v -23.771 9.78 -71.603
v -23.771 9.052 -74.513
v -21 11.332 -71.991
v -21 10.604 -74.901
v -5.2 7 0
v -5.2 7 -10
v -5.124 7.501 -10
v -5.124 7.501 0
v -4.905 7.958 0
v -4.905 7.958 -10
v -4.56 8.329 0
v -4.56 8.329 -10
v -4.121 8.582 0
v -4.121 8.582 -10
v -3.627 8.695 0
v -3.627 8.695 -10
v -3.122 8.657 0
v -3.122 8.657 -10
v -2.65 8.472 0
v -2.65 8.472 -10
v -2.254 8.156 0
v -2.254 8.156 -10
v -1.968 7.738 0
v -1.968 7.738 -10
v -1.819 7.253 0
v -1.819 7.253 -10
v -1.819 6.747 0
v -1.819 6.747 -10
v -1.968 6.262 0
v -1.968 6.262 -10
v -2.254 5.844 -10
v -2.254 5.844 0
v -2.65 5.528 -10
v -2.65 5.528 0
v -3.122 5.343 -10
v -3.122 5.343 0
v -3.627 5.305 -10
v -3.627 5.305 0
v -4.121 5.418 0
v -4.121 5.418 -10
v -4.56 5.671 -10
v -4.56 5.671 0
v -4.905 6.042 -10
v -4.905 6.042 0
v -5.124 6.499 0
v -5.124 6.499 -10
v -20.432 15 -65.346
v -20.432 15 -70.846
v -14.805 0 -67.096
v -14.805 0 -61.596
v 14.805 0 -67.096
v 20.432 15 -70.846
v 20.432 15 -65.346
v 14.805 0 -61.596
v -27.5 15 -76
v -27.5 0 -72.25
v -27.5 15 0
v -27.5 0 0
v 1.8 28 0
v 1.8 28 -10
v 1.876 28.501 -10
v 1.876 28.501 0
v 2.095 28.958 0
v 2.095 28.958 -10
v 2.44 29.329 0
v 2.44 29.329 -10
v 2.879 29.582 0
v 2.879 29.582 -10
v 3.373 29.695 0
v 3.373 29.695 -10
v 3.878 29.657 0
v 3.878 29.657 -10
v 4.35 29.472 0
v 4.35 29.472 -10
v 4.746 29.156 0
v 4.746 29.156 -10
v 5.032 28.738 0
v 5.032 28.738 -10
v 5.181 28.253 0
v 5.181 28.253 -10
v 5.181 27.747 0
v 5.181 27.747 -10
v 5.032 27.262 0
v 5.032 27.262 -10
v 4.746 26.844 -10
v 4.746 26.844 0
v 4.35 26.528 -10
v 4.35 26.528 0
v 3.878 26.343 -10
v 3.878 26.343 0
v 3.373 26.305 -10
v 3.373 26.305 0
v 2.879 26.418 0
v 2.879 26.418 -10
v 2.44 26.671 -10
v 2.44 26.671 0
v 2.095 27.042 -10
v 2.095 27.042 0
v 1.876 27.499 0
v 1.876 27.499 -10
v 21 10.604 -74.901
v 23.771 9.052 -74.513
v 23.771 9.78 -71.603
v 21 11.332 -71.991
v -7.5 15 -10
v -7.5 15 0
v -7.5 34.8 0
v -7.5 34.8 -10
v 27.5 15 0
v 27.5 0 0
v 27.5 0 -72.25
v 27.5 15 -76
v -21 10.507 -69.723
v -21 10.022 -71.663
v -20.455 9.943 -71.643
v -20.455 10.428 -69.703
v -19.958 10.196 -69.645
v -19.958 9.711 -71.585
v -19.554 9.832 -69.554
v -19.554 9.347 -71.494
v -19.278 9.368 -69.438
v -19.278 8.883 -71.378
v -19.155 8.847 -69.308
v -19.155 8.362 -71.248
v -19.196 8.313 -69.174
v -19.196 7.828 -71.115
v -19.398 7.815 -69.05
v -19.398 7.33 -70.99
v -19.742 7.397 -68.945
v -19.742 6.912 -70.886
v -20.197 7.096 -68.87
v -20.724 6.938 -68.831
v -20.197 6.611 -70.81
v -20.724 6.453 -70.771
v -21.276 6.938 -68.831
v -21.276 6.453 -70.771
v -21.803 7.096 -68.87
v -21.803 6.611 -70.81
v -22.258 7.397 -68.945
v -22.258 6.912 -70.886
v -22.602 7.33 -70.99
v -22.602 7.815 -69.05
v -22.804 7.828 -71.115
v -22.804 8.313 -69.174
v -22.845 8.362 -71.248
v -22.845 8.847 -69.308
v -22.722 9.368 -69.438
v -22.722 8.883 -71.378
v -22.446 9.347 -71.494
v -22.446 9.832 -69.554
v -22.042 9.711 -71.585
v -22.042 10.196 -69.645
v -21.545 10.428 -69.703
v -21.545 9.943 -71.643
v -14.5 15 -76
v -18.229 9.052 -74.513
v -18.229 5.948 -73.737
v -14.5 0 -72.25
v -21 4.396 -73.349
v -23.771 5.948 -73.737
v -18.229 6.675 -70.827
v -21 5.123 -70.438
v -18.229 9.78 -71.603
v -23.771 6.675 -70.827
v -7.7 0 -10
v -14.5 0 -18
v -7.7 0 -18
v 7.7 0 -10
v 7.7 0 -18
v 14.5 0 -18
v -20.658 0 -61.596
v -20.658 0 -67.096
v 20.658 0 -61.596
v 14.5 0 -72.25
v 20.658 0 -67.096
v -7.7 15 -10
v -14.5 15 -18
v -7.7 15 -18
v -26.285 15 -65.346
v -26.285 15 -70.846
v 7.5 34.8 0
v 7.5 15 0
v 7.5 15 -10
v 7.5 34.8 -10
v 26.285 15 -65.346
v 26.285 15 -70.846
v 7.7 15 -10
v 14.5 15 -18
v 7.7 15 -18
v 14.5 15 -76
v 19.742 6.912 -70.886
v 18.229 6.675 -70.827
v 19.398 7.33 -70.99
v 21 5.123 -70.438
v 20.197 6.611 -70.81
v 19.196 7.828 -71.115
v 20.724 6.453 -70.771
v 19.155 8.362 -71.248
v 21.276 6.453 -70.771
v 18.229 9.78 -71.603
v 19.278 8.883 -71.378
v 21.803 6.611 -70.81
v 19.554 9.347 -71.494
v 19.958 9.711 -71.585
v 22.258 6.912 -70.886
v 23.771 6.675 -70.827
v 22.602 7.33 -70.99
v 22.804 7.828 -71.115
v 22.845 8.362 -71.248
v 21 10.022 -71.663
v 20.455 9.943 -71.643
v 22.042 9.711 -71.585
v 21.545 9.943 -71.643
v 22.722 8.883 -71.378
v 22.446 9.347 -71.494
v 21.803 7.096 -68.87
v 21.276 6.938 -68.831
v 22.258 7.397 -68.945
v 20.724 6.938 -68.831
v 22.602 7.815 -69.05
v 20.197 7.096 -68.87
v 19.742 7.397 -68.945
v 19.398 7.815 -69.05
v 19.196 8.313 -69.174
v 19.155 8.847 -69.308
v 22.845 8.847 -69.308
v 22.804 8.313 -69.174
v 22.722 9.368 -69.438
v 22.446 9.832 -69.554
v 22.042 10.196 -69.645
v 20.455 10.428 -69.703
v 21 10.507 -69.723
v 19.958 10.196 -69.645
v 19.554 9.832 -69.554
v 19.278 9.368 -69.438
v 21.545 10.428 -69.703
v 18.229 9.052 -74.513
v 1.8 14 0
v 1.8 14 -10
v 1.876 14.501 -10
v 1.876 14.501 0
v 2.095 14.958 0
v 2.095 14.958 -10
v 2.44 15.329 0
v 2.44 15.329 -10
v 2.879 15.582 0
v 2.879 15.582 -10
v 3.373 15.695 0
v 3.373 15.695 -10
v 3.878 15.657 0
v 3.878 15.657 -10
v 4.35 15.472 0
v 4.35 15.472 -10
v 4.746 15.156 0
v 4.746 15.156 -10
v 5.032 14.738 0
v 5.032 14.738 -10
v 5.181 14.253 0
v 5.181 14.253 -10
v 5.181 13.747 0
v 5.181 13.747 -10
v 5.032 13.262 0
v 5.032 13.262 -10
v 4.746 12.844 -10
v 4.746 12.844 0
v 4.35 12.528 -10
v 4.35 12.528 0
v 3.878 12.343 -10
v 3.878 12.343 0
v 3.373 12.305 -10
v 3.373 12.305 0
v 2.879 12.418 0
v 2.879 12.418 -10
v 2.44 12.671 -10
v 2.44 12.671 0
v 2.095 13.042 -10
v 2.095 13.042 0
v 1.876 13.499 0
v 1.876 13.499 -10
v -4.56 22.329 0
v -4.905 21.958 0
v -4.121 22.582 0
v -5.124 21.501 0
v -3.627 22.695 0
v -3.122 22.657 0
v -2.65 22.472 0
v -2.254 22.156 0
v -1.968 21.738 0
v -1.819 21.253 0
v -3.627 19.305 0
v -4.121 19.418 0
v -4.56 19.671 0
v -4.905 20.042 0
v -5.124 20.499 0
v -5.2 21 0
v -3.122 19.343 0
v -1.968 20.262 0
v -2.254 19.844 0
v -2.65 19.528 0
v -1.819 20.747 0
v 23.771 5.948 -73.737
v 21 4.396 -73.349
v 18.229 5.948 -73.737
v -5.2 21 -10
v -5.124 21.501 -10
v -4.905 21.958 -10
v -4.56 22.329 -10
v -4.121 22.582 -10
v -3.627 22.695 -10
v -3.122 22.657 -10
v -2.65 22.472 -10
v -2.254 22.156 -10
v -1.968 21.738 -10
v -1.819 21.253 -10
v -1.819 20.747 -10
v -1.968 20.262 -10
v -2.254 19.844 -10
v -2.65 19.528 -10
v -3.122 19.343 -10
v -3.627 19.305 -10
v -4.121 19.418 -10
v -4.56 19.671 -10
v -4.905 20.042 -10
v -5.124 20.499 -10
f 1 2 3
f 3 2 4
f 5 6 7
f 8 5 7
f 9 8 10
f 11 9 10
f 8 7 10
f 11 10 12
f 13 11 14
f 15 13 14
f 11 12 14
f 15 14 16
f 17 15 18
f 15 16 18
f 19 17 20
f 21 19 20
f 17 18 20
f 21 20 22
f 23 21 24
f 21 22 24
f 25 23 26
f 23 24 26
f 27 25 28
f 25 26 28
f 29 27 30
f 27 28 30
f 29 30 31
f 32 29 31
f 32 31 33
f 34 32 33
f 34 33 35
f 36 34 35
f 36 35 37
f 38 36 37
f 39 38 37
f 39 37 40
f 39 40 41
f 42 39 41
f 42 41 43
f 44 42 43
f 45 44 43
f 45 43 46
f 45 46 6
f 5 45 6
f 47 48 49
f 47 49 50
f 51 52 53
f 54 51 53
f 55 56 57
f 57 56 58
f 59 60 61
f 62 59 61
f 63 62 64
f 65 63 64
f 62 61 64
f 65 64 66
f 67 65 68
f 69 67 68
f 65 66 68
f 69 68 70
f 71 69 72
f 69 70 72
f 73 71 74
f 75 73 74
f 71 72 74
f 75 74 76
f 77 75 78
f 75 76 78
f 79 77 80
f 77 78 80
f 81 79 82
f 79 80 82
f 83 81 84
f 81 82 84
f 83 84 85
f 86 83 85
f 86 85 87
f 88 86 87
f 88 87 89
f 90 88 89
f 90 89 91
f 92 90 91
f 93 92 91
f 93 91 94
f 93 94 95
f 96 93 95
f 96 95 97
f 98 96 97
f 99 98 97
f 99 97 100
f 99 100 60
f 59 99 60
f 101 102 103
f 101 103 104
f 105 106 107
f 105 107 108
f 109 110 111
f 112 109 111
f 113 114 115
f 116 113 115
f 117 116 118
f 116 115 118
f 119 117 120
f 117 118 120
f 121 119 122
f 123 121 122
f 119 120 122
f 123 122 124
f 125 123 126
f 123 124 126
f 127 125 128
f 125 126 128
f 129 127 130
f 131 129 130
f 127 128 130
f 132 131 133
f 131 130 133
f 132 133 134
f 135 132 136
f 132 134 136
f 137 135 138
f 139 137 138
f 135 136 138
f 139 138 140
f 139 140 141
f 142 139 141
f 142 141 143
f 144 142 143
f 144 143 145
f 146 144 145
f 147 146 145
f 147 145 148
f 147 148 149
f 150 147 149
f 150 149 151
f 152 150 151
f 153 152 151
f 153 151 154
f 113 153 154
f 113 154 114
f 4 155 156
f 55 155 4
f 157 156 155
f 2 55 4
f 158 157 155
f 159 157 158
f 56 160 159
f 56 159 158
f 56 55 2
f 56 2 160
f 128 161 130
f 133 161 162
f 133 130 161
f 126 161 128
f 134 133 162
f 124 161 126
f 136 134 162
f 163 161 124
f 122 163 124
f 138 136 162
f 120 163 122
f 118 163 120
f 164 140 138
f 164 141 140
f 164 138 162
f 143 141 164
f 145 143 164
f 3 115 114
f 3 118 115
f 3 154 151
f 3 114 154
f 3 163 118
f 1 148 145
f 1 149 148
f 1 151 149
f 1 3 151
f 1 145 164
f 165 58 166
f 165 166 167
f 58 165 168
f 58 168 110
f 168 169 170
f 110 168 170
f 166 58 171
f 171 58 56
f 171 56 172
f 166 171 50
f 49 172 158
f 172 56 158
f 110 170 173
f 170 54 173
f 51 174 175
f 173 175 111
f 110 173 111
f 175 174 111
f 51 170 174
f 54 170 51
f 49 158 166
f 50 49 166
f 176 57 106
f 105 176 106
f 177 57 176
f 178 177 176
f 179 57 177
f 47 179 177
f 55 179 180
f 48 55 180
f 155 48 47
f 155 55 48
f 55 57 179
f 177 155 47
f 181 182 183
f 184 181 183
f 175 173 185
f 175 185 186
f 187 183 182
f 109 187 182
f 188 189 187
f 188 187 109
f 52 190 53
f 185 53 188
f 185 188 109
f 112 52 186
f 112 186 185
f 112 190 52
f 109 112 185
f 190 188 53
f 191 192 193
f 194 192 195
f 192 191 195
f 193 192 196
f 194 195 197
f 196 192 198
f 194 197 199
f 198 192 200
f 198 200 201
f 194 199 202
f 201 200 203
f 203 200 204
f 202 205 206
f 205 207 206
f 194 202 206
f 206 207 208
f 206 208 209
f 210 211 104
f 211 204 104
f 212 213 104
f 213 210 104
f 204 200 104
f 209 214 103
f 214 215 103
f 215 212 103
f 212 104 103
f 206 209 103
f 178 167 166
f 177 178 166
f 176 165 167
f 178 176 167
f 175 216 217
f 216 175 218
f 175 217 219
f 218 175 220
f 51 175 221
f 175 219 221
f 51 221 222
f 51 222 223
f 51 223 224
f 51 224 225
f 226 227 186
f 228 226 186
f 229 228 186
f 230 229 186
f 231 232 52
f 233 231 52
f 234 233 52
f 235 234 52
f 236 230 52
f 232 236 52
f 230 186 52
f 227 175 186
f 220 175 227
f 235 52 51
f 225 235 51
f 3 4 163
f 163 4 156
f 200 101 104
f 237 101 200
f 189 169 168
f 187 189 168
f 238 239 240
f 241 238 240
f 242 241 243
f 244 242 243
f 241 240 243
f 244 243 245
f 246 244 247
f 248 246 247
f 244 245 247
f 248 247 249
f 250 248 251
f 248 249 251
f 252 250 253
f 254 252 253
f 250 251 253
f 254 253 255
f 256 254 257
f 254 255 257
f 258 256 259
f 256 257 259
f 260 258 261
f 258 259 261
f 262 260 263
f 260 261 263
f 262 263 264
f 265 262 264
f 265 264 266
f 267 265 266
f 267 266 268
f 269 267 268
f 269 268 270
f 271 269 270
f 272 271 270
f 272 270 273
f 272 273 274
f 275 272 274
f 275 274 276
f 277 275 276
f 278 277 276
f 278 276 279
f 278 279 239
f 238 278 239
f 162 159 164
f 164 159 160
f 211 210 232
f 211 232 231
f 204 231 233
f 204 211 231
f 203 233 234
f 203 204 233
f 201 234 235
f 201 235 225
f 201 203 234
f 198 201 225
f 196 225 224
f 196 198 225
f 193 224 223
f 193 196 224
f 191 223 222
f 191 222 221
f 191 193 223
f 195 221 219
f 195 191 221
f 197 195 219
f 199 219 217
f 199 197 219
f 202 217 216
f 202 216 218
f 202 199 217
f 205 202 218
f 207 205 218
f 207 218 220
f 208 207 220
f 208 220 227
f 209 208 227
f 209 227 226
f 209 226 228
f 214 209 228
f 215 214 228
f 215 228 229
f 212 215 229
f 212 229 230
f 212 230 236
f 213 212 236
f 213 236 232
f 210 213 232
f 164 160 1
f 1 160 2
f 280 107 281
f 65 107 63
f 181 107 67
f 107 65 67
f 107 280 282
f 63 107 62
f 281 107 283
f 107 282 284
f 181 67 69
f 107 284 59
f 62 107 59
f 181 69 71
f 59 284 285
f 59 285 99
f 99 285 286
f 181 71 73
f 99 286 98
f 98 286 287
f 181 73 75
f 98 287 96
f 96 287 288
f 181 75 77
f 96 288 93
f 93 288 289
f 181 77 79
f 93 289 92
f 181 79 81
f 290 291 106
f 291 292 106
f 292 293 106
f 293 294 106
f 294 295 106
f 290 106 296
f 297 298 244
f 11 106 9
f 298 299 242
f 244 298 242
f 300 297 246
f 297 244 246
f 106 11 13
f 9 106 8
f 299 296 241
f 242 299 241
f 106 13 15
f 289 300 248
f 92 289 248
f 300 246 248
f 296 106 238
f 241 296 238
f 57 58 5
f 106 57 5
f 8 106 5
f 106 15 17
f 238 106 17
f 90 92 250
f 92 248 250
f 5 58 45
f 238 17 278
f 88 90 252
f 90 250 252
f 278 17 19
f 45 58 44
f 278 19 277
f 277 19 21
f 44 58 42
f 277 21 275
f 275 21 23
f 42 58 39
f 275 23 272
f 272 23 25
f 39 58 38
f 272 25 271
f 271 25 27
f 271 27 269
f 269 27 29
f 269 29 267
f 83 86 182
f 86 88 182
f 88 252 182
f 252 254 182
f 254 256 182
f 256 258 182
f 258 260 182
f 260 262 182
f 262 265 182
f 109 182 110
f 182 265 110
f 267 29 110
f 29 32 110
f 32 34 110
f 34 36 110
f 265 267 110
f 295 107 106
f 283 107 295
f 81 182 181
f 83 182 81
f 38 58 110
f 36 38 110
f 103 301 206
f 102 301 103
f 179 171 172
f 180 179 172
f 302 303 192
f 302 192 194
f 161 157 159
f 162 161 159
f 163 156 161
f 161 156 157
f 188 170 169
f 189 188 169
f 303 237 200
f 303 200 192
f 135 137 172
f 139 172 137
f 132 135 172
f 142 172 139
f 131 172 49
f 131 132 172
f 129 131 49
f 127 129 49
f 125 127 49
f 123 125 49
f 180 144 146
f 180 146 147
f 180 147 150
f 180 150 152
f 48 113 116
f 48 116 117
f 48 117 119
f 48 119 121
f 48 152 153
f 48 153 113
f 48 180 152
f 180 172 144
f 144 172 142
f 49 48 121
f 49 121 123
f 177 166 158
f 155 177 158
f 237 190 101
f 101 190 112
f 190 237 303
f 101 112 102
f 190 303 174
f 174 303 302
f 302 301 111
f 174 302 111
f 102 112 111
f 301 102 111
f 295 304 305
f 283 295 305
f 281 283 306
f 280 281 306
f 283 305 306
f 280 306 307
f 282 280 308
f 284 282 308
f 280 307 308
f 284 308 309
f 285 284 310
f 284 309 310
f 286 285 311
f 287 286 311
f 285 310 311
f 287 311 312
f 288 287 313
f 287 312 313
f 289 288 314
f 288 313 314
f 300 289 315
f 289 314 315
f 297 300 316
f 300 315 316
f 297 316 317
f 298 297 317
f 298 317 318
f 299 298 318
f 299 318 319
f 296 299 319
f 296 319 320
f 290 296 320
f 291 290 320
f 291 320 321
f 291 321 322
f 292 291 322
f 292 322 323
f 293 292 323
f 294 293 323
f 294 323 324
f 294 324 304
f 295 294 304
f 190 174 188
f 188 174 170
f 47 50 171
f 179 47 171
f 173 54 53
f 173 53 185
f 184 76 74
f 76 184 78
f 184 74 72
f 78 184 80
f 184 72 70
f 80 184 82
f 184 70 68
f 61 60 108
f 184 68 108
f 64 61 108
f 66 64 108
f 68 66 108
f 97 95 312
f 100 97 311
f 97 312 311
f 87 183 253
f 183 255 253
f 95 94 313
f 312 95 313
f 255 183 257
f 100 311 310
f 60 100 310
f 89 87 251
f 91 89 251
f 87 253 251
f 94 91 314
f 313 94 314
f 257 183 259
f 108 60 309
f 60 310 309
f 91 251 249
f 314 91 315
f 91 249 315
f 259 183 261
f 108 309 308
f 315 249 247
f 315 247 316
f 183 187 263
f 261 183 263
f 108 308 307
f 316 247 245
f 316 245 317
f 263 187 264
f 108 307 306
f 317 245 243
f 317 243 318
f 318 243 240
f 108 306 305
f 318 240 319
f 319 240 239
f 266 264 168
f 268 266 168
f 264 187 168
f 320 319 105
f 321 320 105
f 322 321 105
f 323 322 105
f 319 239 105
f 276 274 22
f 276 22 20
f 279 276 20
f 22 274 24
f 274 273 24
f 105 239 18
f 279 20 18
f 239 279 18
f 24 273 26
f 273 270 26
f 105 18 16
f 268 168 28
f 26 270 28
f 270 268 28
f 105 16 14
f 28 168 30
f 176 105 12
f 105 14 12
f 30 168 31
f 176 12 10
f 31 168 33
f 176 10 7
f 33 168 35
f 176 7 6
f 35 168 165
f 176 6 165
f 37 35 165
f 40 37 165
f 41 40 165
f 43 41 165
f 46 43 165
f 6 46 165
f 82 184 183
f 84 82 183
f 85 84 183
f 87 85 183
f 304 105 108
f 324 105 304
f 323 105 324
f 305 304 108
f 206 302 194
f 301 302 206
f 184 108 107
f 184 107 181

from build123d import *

# Parameters (mm, degrees)
BOSS_EXTRUDE1_DEPTH = 15
SKETCH2_W           = 15
SKETCH2_H           = 10
BOSS_EXTRUDE2_DEPTH = 19.8
CUT_EXTRUDE2_REACH  = 81.519
SKETCH4_R           = 1.7
LPATTERN1_COUNT     = 2
LPATTERN1_PITCH     = 14
CUT_EXTRUDE4_REACH  = 102.06
CUT_EXTRUDE5_START  = -38.811107067
CUT_EXTRUDE5_DEPTH  = 19.709275544
CUT_EXTRUDE6_DEPTH  = 3
CUT_EXTRUDE7_REACH  = 89.185
SKETCH10_R          = 1.85


# Read off the part's stored shape, not the designer's step: Cut-Extrude5
with BuildPart() as part:
    # Sketch1 → Boss-Extrude1 (new body)
    with BuildSketch(Plane(origin=(0, 0, 0), x_dir=(1, 0, 0), z_dir=(0, 1, 0))):
        Polygon((-27.5, 0), (27.5, 0), (27.5, 76), (14.5, 76), (14.5, 18), (7.7, 18), (7.7, 10), (-7.7, 10), (-7.7, 18), (-14.5, 18), (-14.5, 76), (-27.5, 76), align=None)
    extrude(amount=BOSS_EXTRUDE1_DEPTH)

    # Sketch2 → Boss-Extrude2 (add)
    with BuildSketch(Plane(origin=(0, 15, 0), x_dir=(1, 0, 0), z_dir=(0, 1, 0))):
        with Locations((0, 5)):
            Rectangle(SKETCH2_W, SKETCH2_H)
    extrude(amount=BOSS_EXTRUDE2_DEPTH)

    # Sketch4 → Cut-Extrude2 (cut, up to next)
    with BuildSketch(Plane(origin=(0, 0, -10), x_dir=(-1, 0, 0), z_dir=(0, 0, -1)), mode=Mode.PRIVATE) as cut_extrude2_sk1:
        with Locations((-3.5, 28)):
            Circle(SKETCH4_R)
    cut_extrude2_tool1 = extrude(cut_extrude2_sk1.sketch, amount=-CUT_EXTRUDE2_REACH, mode=Mode.PRIVATE) & part.part
    # Sketch4 → Cut-Extrude2 (cut, up to next)
    with BuildSketch(Plane(origin=(0, 0, -10), x_dir=(-1, 0, 0), z_dir=(0, 0, -1)), mode=Mode.PRIVATE) as cut_extrude2_sk2:
        with Locations((3.5, 21)):
            Circle(SKETCH4_R)
    cut_extrude2_tool2 = extrude(cut_extrude2_sk2.sketch, amount=-CUT_EXTRUDE2_REACH, mode=Mode.PRIVATE) & part.part
    cut_extrude2_1 = cut_extrude2_tool1.solids().sort_by_distance((3.5, 28, -10))[0]
    add(cut_extrude2_1, mode=Mode.SUBTRACT)
    cut_extrude2_2 = cut_extrude2_tool2.solids().sort_by_distance((-3.5, 21, -10))[0]
    add(cut_extrude2_2, mode=Mode.SUBTRACT)
    cut_extrude2 = cut_extrude2_1 + cut_extrude2_2  # Cut-Extrude2 as one shape, for the pattern or mirror that repeats it

    # LPattern1: Cut-Extrude2 ×2
    with Locations(*[(0, -i * LPATTERN1_PITCH, 0) for i in range(1, LPATTERN1_COUNT)]):
        add(cut_extrude2, mode=Mode.SUBTRACT)

    # Sketch7 → Cut-Extrude4 (cut, up to next)
    with BuildSketch(Plane.ZY.offset(27.5), mode=Mode.PRIVATE) as cut_extrude4_sk1:
        Polygon((-76, 15), (-72.25, 0), (-76, 0), align=None)
    cut_extrude4_tool1 = extrude(cut_extrude4_sk1.sketch, amount=-CUT_EXTRUDE4_REACH, mode=Mode.PRIVATE) & part.part
    cut_extrude4 = cut_extrude4_tool1.solids().sort_by_distance((-27.5, 5, -74.75))[0]
    add(cut_extrude4, mode=Mode.SUBTRACT)

    # Cut-Extrude5 outline → Cut-Extrude5 (cut)
    with BuildSketch(Plane(origin=(0, 0, 0), x_dir=(0.9396926207859096, 0.3318082769460259, -0.08295206923650612), z_dir=(0.34202014332566544, -0.9116357484973617, 0.2279089371243395)).offset(CUT_EXTRUDE5_START)):
        Polygon((-8.802397208, -59.757011885), (-14.302397208, -59.757011885), (-13.846160827, -65.092795636), (-8.346160827, -65.092795636), align=None)
    cut_extrude5 = extrude(amount=CUT_EXTRUDE5_DEPTH, mode=Mode.SUBTRACT)

    # Sketch9 → Cut-Extrude6 (cut)
    with BuildSketch(Plane(origin=(0, -17, -68), x_dir=(-1, 0, 0), z_dir=(0, -0.24253562503633286, -0.970142500145332))):
        Polygon((21, 22.054021957), (23.771281292, 23.654021957), (23.771281292, 26.854021957), (21, 28.454021957), (18.228718708, 26.854021957), (18.228718708, 23.654021957), align=None)
    cut_extrude6 = extrude(amount=-CUT_EXTRUDE6_DEPTH, mode=Mode.SUBTRACT)

    # Sketch10 → Cut-Extrude7 (cut, up to next)
    with BuildSketch(Plane(origin=(0, -16.272393125, -65.0895725), x_dir=(-1, 0, 0), z_dir=(0, -0.2425356250363299, -0.9701425001453328)), mode=Mode.PRIVATE) as cut_extrude7_sk1:
        with Locations(Location((21, 25.254021957, 0), (0, 0, 90))):
            Circle(SKETCH10_R)
    cut_extrude7_tool1 = extrude(cut_extrude7_sk1.sketch, amount=-CUT_EXTRUDE7_REACH, mode=Mode.PRIVATE) & part.part
    cut_extrude7 = cut_extrude7_tool1.solids().sort_by_distance((-21, 8.227607, -71.214572))[0]
    add(cut_extrude7, mode=Mode.SUBTRACT)

    # Mirror1: Cut-Extrude4, Cut-Extrude5, Cut-Extrude6, Cut-Extrude7 across plane
    add(cut_extrude4.mirror(Plane(origin=(0, 0, 0), x_dir=(0, 0, 1), z_dir=(1, 0, 0))), mode=Mode.SUBTRACT)
    add(cut_extrude5.mirror(Plane(origin=(0, 0, 0), x_dir=(0, 0, 1), z_dir=(1, 0, 0))), mode=Mode.SUBTRACT)
    add(cut_extrude6.mirror(Plane(origin=(0, 0, 0), x_dir=(0, 0, 1), z_dir=(1, 0, 0))), mode=Mode.SUBTRACT)
    add(cut_extrude7.mirror(Plane(origin=(0, 0, 0), x_dir=(0, 0, 1), z_dir=(1, 0, 0))), mode=Mode.SUBTRACT)


solid = part.part
